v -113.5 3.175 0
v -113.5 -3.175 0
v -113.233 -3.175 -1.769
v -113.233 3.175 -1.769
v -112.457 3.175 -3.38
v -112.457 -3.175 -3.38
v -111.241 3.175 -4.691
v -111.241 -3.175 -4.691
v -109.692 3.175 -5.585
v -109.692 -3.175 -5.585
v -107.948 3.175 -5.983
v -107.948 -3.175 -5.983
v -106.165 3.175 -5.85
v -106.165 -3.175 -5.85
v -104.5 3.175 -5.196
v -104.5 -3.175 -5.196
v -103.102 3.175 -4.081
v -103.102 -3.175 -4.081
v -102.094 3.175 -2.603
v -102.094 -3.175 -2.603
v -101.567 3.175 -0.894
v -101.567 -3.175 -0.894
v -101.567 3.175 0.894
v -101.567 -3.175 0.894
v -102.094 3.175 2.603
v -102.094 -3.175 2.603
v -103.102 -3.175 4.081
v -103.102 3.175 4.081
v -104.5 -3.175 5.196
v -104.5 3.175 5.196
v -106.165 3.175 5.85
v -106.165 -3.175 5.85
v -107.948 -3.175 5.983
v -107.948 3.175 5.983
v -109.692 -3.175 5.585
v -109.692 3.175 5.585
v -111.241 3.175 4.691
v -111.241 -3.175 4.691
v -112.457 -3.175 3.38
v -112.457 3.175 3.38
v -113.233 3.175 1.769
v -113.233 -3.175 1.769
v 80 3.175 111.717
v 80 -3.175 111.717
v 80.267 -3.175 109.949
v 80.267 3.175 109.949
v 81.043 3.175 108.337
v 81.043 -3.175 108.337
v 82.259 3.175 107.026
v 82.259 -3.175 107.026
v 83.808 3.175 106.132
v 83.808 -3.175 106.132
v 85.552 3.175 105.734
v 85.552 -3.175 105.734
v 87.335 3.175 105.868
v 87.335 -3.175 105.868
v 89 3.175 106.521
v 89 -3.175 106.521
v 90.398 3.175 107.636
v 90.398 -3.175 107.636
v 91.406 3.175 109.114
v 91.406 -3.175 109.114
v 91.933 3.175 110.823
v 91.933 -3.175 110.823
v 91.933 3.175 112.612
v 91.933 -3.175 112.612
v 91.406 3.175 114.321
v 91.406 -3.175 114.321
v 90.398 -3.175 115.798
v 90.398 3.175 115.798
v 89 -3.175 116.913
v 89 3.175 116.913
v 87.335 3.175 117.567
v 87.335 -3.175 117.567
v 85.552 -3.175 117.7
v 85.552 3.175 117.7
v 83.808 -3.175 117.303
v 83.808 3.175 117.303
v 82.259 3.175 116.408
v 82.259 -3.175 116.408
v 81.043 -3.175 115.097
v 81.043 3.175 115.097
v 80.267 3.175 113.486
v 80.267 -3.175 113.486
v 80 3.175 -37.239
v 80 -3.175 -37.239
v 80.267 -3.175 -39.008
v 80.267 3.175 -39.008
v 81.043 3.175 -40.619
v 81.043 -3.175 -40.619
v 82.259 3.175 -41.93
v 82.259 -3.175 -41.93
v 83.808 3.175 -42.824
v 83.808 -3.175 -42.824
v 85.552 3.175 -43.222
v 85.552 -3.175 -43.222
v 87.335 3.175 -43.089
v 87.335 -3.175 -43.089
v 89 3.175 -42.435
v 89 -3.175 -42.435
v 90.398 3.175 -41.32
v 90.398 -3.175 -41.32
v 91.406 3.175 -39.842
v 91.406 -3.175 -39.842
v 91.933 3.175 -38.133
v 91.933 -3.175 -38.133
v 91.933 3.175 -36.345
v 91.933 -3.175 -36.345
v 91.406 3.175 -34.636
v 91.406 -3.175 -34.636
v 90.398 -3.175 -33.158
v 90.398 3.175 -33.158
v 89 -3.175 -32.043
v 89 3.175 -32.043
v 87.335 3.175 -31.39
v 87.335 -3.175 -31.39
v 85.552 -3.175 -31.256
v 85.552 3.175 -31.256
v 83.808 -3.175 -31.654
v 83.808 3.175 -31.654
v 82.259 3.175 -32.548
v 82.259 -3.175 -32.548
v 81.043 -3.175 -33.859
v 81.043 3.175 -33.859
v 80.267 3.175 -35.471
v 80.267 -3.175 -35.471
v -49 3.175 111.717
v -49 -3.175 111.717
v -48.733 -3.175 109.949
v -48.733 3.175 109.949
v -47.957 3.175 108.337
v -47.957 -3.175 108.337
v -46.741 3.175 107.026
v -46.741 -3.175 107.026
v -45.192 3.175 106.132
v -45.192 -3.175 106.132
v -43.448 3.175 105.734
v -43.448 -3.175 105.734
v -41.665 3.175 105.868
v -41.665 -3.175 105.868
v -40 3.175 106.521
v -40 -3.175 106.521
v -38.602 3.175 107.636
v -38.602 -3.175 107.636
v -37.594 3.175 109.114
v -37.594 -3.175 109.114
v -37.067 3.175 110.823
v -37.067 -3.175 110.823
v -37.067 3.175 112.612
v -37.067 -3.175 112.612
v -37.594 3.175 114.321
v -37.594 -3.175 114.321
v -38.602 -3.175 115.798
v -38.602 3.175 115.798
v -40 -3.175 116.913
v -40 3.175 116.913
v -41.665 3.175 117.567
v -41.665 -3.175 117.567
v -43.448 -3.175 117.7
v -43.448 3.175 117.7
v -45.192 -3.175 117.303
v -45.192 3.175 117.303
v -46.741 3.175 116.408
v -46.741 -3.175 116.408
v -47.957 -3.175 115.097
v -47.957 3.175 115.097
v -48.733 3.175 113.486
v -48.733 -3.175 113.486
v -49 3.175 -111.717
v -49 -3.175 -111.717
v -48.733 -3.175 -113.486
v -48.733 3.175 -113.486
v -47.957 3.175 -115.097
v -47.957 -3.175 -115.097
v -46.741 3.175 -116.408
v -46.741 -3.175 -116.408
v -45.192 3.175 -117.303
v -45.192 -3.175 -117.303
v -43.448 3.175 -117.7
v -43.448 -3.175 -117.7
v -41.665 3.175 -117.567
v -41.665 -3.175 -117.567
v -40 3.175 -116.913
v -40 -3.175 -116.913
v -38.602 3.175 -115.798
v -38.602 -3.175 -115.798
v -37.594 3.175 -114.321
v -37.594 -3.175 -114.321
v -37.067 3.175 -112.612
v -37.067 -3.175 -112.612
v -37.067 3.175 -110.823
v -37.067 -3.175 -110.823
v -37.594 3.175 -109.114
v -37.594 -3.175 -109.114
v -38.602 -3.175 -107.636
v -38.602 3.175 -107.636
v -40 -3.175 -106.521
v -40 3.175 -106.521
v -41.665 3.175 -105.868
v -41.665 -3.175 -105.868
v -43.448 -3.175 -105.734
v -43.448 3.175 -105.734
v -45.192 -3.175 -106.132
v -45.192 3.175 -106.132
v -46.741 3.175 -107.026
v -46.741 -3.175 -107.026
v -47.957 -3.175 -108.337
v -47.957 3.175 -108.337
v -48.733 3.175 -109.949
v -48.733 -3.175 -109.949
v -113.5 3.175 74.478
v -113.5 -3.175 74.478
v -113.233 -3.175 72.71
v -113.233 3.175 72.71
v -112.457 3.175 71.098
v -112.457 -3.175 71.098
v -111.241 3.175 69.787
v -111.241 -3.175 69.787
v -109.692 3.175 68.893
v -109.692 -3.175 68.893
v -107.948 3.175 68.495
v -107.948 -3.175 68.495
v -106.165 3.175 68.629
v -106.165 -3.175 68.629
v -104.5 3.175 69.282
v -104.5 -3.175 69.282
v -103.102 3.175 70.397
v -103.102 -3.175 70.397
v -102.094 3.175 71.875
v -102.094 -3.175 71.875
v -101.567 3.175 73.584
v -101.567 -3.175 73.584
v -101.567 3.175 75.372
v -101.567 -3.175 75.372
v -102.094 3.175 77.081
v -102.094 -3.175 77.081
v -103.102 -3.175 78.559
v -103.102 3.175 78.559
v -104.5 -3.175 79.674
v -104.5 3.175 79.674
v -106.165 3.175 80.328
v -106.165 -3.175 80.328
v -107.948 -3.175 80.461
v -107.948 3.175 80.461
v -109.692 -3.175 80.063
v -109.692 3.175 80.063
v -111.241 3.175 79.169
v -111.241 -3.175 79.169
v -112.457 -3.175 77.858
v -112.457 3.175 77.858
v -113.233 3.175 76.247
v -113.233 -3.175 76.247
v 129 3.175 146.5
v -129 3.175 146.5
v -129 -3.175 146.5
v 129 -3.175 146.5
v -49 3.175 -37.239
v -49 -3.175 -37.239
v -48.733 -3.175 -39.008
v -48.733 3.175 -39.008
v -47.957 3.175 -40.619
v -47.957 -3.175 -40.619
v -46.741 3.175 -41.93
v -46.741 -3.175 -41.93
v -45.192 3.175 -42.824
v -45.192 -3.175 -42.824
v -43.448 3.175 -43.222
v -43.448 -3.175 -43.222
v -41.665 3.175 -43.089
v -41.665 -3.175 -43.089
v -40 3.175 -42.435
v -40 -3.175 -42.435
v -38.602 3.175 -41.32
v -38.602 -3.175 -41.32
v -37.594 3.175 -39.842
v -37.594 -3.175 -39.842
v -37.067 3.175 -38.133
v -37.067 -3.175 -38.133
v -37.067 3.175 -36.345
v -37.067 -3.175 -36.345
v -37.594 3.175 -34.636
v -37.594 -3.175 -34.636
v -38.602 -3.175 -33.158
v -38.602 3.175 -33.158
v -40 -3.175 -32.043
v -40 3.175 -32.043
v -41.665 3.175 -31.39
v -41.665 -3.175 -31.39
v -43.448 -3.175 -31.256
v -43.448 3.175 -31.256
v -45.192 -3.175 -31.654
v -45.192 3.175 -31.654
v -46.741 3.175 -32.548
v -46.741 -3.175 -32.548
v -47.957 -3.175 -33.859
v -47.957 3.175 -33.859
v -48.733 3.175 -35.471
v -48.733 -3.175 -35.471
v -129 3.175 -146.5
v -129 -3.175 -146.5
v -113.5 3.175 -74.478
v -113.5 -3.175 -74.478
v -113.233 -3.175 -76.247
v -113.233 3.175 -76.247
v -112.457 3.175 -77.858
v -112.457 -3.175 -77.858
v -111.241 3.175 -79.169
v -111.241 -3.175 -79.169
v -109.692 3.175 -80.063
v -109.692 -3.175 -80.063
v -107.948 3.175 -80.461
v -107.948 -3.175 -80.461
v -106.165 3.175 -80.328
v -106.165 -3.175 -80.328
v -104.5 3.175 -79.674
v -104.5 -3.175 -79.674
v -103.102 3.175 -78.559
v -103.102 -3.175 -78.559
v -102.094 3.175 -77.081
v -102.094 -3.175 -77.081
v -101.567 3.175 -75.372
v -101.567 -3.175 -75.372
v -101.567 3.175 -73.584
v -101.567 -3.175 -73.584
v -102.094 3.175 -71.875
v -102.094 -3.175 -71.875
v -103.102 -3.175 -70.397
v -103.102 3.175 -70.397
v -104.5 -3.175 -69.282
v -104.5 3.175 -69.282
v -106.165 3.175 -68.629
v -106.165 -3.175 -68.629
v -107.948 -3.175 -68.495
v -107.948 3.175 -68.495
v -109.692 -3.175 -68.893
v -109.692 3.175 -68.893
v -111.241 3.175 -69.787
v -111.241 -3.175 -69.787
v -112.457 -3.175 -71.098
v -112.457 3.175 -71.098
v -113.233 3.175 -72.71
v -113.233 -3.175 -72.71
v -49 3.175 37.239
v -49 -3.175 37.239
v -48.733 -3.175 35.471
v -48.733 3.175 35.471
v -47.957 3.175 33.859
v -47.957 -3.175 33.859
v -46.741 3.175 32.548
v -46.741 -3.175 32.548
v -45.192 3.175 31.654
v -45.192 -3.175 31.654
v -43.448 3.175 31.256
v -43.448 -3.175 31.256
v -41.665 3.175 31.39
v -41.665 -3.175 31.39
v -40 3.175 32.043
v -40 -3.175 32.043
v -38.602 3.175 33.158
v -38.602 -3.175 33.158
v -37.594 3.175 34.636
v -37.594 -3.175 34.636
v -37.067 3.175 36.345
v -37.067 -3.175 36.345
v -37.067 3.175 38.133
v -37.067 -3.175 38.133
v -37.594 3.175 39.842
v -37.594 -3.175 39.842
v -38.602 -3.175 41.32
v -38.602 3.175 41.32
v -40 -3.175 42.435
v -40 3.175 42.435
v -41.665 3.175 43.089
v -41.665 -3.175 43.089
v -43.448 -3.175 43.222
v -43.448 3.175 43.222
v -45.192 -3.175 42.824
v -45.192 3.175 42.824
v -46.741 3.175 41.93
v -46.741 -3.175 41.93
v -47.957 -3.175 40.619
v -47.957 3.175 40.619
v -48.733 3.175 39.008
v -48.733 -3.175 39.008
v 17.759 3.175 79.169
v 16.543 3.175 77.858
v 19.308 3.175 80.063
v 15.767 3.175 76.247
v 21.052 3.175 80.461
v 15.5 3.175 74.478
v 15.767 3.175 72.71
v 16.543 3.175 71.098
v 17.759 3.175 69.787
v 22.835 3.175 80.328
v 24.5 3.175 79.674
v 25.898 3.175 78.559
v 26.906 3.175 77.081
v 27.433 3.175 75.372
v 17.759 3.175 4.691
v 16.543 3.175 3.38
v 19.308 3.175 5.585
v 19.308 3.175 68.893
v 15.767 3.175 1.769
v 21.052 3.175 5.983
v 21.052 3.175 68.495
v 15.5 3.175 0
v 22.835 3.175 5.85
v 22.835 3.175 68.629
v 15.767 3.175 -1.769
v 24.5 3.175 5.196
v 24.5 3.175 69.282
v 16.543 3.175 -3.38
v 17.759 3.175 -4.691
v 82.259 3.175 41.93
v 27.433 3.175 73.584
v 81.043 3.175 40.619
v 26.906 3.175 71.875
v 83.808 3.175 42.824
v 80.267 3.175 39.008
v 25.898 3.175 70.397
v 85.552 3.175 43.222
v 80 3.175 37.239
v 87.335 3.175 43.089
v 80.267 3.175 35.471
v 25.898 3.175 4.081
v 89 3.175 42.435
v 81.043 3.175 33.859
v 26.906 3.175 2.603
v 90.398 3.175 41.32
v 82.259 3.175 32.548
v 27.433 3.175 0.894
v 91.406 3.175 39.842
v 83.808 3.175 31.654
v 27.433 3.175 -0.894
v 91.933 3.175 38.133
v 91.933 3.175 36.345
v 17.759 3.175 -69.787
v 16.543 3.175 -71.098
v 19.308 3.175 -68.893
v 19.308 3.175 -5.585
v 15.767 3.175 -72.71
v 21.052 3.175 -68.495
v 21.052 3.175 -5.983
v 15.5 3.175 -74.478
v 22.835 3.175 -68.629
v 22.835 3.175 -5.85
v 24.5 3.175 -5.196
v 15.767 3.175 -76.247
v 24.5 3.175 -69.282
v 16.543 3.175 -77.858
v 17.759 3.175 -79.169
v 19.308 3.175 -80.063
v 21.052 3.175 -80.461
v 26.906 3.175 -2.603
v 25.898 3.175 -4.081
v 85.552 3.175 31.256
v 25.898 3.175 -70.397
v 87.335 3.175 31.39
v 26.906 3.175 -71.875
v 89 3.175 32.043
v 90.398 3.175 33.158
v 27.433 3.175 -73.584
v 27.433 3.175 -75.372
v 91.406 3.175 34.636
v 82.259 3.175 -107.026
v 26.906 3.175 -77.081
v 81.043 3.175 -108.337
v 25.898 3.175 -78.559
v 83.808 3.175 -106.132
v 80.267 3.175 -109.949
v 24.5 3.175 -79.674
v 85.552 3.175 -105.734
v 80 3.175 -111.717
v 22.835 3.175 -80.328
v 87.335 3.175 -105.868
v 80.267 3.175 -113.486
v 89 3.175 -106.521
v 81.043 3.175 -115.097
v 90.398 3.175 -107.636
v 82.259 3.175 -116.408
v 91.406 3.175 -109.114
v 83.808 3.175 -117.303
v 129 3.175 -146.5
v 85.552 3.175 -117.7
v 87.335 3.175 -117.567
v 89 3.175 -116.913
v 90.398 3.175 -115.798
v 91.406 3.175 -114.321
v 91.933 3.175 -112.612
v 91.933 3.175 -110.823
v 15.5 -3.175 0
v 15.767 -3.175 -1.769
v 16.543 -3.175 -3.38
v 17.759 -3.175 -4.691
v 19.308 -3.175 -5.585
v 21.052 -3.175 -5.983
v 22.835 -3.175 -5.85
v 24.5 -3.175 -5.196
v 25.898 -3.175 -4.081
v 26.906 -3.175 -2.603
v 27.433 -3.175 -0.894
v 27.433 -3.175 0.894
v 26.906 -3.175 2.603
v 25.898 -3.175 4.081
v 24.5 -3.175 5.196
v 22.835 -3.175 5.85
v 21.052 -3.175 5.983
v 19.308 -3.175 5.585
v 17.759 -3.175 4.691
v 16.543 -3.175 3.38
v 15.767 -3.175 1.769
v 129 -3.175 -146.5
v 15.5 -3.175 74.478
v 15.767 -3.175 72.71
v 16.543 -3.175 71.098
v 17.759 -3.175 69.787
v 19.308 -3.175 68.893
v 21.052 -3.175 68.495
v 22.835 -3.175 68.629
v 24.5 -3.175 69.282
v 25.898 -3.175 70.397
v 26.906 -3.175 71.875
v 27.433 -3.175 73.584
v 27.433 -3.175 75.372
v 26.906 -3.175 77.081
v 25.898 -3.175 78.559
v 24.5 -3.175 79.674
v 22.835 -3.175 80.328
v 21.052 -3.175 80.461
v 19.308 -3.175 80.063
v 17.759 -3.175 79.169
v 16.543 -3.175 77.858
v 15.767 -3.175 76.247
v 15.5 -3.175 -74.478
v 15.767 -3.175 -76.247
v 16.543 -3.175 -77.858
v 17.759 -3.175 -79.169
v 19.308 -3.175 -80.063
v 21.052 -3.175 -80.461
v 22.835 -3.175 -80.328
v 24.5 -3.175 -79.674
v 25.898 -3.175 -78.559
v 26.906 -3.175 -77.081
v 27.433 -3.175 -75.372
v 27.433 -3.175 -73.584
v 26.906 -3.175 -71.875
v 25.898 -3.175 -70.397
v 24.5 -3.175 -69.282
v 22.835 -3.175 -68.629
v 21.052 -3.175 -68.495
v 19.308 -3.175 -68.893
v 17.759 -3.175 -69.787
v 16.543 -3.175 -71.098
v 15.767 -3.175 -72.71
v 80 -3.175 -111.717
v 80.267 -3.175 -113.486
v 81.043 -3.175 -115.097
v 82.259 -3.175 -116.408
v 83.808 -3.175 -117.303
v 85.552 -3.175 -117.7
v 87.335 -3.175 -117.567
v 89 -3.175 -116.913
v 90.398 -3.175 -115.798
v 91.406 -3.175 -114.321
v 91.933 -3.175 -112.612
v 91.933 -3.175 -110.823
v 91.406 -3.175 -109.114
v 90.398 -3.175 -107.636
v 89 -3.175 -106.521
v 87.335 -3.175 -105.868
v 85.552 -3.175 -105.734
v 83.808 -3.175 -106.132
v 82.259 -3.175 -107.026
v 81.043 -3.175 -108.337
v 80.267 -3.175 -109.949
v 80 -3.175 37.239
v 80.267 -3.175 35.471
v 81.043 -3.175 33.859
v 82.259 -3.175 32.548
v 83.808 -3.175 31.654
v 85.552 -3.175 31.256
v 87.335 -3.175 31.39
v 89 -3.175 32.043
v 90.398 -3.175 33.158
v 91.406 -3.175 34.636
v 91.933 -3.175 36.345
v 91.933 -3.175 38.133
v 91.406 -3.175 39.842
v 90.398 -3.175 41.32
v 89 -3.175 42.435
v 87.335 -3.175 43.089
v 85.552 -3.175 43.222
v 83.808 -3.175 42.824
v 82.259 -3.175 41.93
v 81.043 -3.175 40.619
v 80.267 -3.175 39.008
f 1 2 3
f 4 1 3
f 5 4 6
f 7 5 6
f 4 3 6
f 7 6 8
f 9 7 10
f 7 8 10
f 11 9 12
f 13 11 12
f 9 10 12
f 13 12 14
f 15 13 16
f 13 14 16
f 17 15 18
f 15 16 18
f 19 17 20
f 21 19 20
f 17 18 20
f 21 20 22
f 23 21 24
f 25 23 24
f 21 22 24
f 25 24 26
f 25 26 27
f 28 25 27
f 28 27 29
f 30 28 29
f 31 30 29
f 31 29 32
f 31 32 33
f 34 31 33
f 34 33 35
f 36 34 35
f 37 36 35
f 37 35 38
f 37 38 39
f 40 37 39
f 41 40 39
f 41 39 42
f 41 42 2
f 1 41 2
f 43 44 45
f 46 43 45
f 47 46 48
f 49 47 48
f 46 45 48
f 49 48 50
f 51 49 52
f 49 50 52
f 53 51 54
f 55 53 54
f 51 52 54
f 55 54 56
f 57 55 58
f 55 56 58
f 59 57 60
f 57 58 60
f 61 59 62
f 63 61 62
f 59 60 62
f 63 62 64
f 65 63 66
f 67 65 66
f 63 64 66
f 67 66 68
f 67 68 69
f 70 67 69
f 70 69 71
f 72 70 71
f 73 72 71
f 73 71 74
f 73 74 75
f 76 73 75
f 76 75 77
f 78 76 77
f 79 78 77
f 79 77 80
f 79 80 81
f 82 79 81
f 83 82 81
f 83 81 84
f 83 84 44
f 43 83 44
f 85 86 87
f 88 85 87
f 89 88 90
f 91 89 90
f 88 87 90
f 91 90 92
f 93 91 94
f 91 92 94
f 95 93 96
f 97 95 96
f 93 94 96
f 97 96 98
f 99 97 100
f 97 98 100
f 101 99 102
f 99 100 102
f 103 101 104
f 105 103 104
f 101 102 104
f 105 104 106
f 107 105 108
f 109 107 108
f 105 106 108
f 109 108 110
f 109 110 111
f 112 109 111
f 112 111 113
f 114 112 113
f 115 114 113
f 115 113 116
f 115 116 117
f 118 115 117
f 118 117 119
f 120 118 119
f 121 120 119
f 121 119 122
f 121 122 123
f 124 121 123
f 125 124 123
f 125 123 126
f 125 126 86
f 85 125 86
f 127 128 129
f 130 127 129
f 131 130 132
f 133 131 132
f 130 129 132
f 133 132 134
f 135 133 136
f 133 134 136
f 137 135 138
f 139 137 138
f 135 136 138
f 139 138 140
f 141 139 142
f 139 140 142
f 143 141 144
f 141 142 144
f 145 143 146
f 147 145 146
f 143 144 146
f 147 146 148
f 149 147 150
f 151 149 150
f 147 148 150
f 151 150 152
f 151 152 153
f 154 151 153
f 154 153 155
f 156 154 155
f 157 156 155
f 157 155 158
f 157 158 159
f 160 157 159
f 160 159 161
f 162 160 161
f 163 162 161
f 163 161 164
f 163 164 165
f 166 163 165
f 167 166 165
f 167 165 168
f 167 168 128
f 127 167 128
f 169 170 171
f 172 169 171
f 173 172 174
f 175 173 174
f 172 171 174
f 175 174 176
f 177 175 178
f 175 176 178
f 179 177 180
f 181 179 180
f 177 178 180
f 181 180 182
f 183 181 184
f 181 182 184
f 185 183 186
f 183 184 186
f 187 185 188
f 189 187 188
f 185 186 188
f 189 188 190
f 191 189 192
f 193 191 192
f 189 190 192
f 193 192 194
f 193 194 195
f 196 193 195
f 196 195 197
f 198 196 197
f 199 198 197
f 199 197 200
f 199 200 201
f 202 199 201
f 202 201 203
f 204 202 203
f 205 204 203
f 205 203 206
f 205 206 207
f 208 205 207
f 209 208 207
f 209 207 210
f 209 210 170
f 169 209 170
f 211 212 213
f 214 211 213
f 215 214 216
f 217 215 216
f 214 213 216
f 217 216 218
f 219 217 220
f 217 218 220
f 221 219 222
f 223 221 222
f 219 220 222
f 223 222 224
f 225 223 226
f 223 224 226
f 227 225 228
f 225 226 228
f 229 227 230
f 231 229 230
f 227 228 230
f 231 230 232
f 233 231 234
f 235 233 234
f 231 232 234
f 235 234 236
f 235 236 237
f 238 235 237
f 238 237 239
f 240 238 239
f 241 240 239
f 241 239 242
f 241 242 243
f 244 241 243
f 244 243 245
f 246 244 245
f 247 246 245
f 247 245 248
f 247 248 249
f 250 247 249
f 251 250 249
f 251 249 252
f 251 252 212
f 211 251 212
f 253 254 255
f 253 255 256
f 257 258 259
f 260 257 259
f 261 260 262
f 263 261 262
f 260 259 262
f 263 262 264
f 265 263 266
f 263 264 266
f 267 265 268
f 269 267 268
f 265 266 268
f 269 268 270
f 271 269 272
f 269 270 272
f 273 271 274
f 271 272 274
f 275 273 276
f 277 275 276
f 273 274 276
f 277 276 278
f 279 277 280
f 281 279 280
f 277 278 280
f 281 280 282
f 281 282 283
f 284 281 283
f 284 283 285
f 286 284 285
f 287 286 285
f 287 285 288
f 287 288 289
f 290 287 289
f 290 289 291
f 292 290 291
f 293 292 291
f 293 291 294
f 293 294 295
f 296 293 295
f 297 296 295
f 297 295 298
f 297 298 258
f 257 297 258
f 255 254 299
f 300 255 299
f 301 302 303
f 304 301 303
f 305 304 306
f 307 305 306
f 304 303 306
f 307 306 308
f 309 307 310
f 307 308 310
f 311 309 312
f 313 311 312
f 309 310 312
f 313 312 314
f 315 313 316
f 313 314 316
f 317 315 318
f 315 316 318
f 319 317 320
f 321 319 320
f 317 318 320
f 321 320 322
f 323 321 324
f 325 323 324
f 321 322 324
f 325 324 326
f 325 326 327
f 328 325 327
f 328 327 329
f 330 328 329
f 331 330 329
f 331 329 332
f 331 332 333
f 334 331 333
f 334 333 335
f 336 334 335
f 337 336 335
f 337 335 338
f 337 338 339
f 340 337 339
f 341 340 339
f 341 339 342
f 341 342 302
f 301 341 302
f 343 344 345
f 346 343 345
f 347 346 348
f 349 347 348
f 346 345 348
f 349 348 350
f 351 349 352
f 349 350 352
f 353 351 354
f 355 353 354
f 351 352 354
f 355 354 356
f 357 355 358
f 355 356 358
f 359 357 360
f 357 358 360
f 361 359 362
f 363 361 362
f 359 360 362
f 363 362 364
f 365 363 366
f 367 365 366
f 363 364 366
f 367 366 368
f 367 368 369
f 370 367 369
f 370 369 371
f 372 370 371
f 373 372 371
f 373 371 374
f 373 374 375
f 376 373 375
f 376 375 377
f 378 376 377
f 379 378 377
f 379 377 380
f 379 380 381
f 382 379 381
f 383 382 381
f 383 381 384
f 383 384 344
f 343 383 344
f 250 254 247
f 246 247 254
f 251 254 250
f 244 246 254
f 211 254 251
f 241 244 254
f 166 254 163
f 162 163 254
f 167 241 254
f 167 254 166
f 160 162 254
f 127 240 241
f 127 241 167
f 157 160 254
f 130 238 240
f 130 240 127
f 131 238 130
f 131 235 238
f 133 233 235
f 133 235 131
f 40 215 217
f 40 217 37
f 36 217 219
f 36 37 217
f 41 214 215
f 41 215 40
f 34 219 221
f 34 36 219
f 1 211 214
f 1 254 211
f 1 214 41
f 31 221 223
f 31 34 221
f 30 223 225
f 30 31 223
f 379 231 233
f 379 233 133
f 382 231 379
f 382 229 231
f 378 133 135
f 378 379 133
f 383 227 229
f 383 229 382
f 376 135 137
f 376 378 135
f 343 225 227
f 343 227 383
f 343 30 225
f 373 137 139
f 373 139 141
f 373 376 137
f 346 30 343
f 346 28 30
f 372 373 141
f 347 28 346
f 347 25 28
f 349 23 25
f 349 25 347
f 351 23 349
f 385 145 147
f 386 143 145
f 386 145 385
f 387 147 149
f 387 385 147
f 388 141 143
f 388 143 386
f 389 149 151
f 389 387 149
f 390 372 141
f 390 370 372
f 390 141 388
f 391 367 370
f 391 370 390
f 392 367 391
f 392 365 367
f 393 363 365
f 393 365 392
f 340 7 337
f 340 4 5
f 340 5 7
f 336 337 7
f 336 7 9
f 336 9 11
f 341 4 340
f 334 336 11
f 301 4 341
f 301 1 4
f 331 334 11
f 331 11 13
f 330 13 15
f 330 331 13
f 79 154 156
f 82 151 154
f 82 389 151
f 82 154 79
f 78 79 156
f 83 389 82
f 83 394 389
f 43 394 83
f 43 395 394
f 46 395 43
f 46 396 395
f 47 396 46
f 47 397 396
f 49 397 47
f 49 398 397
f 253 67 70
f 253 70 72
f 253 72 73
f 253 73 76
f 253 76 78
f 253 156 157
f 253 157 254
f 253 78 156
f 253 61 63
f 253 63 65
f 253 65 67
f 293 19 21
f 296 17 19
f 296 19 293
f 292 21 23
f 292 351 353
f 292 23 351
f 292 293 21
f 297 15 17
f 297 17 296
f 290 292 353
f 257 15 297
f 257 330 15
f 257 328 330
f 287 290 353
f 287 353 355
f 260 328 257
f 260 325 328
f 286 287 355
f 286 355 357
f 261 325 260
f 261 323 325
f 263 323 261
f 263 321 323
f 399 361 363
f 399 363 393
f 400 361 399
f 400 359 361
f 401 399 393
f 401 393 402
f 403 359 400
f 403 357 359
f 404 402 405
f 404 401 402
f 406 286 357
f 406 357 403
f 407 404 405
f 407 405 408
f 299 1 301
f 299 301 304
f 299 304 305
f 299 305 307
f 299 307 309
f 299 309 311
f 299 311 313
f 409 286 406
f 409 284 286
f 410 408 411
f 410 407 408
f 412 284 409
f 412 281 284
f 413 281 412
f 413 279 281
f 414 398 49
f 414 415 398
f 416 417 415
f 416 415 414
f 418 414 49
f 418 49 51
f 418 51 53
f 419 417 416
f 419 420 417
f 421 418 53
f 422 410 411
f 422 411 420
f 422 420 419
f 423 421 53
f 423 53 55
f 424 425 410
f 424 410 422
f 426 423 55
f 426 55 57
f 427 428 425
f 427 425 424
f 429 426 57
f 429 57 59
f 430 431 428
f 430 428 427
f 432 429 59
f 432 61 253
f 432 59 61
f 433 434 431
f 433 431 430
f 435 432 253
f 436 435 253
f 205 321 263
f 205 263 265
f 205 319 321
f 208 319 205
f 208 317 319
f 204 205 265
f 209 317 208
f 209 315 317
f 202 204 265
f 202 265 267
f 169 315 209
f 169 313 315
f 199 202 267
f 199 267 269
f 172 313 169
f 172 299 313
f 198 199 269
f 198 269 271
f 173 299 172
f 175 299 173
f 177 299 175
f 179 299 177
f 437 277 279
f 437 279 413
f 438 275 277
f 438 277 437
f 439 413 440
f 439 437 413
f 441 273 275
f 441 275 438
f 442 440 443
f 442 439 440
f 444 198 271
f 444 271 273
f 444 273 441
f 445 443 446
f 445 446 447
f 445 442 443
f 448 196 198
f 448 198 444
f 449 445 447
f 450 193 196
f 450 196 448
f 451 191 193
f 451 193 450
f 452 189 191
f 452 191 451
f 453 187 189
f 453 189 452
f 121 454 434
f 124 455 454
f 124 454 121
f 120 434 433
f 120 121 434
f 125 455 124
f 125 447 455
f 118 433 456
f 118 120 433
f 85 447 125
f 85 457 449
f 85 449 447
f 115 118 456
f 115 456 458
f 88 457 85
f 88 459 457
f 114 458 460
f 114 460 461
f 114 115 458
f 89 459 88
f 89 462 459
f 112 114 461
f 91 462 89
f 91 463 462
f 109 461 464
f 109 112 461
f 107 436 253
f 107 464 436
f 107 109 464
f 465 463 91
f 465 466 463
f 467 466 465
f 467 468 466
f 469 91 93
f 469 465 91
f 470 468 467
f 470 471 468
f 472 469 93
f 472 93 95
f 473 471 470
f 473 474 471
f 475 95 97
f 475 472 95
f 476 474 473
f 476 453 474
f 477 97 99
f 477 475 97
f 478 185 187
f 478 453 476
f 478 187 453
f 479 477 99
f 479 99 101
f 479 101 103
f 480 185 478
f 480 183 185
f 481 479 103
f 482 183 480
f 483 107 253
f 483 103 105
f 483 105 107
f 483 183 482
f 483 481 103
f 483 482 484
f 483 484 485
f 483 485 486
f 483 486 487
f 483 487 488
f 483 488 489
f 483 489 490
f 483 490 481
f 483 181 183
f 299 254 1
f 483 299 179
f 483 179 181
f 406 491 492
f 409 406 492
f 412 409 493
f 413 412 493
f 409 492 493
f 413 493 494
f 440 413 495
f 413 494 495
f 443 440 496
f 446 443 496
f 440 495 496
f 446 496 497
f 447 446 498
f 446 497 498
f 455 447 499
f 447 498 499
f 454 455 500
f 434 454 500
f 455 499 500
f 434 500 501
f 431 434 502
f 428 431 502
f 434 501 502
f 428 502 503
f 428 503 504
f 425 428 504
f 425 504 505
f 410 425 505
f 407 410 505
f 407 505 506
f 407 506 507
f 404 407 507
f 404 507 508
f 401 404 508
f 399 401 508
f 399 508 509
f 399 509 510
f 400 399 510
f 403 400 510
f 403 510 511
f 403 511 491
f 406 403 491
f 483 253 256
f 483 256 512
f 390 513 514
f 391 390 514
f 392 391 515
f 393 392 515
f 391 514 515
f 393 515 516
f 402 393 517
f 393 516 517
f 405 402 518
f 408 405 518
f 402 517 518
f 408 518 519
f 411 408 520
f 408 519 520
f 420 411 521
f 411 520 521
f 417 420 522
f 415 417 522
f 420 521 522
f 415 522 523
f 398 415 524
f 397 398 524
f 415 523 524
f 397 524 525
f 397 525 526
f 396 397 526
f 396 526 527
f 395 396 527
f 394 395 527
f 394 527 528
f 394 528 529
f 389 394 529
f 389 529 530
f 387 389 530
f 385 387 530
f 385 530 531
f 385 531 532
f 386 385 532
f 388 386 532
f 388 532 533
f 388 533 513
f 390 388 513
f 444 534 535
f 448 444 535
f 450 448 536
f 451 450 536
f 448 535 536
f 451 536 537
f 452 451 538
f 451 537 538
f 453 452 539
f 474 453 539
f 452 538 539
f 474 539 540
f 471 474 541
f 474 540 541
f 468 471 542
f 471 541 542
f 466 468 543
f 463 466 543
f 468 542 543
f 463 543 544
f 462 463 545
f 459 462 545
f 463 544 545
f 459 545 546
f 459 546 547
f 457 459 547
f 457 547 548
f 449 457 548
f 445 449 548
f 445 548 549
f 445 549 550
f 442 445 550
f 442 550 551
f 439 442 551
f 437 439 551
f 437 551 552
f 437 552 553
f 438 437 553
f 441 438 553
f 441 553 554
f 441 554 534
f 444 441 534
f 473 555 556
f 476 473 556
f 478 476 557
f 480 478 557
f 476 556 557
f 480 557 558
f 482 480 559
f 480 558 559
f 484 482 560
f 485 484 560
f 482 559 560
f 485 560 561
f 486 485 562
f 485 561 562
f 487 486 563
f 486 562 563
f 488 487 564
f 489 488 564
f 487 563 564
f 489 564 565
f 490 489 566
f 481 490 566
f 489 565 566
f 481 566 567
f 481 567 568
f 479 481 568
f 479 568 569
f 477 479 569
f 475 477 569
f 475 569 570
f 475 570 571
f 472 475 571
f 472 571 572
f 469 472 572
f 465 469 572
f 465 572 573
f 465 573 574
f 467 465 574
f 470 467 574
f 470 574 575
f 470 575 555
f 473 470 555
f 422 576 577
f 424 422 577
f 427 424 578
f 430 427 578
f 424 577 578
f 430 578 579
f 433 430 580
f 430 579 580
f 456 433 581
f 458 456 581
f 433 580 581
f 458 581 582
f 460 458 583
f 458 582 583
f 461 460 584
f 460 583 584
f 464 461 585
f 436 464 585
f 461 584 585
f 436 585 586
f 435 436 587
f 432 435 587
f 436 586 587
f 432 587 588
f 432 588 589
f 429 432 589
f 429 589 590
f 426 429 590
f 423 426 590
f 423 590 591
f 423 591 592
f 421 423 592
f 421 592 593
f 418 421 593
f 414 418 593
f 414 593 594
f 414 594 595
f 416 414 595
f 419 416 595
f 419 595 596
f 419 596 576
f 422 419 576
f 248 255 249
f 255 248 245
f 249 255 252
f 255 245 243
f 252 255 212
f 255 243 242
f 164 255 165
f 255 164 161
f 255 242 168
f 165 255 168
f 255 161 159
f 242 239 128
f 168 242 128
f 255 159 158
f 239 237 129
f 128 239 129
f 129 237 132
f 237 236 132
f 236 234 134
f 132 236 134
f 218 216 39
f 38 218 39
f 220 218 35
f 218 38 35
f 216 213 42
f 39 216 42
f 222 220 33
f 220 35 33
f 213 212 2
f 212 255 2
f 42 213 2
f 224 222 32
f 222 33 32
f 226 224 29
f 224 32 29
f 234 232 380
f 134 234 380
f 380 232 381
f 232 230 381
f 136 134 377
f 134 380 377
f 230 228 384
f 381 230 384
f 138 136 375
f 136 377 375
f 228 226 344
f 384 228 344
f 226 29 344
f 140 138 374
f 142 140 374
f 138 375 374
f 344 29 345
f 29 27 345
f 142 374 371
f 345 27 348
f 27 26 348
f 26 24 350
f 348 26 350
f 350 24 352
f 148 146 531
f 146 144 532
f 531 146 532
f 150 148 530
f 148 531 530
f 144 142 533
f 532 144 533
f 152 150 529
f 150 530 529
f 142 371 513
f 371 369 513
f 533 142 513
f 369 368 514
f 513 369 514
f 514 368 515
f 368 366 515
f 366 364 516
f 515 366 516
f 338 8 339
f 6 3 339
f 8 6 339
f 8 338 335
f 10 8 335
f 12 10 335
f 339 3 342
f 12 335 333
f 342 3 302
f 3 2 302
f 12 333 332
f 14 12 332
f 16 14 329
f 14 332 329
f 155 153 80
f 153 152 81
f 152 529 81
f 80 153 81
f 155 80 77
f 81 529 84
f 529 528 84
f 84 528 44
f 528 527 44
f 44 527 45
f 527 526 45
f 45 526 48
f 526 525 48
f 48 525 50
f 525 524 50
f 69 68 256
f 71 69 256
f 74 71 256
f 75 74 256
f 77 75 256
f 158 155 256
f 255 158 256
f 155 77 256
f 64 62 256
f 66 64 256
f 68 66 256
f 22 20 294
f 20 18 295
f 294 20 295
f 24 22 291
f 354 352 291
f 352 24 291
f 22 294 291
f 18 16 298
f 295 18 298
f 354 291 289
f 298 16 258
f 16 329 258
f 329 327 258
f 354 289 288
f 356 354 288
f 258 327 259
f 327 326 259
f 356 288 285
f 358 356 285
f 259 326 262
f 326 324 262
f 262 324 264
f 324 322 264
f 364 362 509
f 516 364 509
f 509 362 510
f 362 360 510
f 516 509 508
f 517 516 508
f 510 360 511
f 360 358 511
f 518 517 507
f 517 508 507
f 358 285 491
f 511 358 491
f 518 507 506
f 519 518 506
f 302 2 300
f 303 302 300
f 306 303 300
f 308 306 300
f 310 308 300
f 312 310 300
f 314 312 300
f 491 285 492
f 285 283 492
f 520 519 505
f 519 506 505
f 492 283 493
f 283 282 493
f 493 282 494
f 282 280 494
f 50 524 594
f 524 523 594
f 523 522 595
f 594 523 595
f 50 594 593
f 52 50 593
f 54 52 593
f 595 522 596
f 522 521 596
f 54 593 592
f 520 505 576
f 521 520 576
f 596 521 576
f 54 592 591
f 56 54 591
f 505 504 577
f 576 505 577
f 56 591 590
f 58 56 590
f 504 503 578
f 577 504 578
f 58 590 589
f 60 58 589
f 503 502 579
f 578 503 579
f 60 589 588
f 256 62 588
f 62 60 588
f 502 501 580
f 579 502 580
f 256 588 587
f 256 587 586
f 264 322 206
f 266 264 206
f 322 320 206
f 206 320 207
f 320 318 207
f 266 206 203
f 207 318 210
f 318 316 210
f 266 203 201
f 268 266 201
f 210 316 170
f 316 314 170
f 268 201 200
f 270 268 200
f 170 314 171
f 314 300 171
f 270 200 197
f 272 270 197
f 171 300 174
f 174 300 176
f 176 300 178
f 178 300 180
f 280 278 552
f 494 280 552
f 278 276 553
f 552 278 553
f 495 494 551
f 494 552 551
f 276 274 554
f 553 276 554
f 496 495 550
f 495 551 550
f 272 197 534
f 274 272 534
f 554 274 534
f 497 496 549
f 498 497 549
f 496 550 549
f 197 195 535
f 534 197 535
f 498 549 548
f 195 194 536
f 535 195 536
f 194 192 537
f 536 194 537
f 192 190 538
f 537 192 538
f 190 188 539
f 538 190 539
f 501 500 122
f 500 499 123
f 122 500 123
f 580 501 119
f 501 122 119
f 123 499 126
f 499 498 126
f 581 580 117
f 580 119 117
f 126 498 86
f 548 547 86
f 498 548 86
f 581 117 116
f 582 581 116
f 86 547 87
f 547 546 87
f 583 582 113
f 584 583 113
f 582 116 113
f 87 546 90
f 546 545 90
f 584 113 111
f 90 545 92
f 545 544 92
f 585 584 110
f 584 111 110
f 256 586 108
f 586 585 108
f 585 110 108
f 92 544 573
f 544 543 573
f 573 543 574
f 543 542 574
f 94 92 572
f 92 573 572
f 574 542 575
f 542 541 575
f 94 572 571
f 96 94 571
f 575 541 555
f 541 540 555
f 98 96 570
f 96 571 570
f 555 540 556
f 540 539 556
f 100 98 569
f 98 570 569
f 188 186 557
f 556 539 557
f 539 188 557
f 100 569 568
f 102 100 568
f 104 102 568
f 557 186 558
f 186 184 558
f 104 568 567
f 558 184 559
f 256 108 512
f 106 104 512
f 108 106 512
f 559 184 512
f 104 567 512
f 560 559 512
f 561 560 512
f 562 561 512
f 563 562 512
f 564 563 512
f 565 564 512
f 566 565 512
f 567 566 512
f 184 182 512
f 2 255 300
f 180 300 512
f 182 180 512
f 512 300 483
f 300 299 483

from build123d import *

# Parameters (mm, degrees)
SKETCH1_W         = 258
SKETCH1_H         = 293
MAIN_BASE_DEPTH   = 3.175
ALIGNMENT_HOLES_D = 12


with BuildPart() as part:
    # Sketch1 → Main Base (new, symmetric)
    with BuildSketch(Plane(origin=(0, 0, 0), x_dir=(1, 0, 0), z_dir=(0, 1, 0))):
        Rectangle(SKETCH1_W, SKETCH1_H)
    extrude(amount=MAIN_BASE_DEPTH, both=True)

    # Alignment Holes (through all)
    with Locations(Plane(origin=(0, 3.175, 0), x_dir=(1, 0, 0), z_dir=(0, 1, 0))):
        with Locations((-107.5, 0), (-43, -37.239092363), (-43, 37.239092363), (86, 37.239092363), (21.5, 0), (86, -37.239092363), (-107.5, 74.478184725), (-43, 111.717277088), (21.5, 74.478184725), (86, 111.717277088), (-107.5, -74.478184725), (-43, -111.717277088), (21.5, -74.478184725), (86, -111.717277088)):
            Hole(ALIGNMENT_HOLES_D / 2)


solid = part.part
